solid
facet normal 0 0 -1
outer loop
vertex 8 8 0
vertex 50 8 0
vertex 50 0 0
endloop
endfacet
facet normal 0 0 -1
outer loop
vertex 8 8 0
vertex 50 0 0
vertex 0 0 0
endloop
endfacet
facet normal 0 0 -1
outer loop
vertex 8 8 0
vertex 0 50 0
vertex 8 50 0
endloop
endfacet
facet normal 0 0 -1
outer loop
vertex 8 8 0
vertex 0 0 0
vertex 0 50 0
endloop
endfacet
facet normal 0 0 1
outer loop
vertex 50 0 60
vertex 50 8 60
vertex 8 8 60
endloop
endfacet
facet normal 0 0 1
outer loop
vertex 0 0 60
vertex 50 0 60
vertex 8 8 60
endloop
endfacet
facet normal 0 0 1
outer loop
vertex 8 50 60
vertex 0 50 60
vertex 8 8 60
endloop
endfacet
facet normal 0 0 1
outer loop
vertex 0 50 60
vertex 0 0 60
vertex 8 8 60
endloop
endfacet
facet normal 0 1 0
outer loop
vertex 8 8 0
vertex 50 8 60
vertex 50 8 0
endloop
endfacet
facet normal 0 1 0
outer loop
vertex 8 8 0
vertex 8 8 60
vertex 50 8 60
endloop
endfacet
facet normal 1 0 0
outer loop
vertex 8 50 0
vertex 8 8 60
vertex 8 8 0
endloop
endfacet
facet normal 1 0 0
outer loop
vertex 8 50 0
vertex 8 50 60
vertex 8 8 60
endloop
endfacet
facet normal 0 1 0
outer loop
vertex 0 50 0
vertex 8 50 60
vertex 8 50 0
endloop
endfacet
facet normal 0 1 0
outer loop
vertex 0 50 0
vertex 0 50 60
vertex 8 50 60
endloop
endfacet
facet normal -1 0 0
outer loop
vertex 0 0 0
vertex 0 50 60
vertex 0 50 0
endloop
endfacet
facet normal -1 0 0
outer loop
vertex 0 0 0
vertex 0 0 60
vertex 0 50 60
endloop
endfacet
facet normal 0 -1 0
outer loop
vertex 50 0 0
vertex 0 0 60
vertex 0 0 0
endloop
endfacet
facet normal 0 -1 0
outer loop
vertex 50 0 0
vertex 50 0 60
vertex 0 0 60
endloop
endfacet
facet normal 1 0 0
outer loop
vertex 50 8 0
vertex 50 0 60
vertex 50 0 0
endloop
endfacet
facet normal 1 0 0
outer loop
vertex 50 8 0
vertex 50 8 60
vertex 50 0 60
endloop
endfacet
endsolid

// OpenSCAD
$fn = 32;

// ----------------------------------------------------------------------
// Structural section: angle 50 x 50 mm
// ----------------------------------------------------------------------

// --- parameters (mm) ---
sec_w = 50;               // leg width, X
sec_h = 50;               // leg height, Y
flange_t = 8;             // leg thickness
plate_t = 60;             // cut length, Z (extrusion height)

profile = [[0, 0], [50, 0], [50, 8], [8, 8], [8, 50], [0, 50]];  // primary outline, 6 points, counter clockwise

// --- the one profile operation ---
linear_extrude(height = plate_t) polygon(points = profile);
